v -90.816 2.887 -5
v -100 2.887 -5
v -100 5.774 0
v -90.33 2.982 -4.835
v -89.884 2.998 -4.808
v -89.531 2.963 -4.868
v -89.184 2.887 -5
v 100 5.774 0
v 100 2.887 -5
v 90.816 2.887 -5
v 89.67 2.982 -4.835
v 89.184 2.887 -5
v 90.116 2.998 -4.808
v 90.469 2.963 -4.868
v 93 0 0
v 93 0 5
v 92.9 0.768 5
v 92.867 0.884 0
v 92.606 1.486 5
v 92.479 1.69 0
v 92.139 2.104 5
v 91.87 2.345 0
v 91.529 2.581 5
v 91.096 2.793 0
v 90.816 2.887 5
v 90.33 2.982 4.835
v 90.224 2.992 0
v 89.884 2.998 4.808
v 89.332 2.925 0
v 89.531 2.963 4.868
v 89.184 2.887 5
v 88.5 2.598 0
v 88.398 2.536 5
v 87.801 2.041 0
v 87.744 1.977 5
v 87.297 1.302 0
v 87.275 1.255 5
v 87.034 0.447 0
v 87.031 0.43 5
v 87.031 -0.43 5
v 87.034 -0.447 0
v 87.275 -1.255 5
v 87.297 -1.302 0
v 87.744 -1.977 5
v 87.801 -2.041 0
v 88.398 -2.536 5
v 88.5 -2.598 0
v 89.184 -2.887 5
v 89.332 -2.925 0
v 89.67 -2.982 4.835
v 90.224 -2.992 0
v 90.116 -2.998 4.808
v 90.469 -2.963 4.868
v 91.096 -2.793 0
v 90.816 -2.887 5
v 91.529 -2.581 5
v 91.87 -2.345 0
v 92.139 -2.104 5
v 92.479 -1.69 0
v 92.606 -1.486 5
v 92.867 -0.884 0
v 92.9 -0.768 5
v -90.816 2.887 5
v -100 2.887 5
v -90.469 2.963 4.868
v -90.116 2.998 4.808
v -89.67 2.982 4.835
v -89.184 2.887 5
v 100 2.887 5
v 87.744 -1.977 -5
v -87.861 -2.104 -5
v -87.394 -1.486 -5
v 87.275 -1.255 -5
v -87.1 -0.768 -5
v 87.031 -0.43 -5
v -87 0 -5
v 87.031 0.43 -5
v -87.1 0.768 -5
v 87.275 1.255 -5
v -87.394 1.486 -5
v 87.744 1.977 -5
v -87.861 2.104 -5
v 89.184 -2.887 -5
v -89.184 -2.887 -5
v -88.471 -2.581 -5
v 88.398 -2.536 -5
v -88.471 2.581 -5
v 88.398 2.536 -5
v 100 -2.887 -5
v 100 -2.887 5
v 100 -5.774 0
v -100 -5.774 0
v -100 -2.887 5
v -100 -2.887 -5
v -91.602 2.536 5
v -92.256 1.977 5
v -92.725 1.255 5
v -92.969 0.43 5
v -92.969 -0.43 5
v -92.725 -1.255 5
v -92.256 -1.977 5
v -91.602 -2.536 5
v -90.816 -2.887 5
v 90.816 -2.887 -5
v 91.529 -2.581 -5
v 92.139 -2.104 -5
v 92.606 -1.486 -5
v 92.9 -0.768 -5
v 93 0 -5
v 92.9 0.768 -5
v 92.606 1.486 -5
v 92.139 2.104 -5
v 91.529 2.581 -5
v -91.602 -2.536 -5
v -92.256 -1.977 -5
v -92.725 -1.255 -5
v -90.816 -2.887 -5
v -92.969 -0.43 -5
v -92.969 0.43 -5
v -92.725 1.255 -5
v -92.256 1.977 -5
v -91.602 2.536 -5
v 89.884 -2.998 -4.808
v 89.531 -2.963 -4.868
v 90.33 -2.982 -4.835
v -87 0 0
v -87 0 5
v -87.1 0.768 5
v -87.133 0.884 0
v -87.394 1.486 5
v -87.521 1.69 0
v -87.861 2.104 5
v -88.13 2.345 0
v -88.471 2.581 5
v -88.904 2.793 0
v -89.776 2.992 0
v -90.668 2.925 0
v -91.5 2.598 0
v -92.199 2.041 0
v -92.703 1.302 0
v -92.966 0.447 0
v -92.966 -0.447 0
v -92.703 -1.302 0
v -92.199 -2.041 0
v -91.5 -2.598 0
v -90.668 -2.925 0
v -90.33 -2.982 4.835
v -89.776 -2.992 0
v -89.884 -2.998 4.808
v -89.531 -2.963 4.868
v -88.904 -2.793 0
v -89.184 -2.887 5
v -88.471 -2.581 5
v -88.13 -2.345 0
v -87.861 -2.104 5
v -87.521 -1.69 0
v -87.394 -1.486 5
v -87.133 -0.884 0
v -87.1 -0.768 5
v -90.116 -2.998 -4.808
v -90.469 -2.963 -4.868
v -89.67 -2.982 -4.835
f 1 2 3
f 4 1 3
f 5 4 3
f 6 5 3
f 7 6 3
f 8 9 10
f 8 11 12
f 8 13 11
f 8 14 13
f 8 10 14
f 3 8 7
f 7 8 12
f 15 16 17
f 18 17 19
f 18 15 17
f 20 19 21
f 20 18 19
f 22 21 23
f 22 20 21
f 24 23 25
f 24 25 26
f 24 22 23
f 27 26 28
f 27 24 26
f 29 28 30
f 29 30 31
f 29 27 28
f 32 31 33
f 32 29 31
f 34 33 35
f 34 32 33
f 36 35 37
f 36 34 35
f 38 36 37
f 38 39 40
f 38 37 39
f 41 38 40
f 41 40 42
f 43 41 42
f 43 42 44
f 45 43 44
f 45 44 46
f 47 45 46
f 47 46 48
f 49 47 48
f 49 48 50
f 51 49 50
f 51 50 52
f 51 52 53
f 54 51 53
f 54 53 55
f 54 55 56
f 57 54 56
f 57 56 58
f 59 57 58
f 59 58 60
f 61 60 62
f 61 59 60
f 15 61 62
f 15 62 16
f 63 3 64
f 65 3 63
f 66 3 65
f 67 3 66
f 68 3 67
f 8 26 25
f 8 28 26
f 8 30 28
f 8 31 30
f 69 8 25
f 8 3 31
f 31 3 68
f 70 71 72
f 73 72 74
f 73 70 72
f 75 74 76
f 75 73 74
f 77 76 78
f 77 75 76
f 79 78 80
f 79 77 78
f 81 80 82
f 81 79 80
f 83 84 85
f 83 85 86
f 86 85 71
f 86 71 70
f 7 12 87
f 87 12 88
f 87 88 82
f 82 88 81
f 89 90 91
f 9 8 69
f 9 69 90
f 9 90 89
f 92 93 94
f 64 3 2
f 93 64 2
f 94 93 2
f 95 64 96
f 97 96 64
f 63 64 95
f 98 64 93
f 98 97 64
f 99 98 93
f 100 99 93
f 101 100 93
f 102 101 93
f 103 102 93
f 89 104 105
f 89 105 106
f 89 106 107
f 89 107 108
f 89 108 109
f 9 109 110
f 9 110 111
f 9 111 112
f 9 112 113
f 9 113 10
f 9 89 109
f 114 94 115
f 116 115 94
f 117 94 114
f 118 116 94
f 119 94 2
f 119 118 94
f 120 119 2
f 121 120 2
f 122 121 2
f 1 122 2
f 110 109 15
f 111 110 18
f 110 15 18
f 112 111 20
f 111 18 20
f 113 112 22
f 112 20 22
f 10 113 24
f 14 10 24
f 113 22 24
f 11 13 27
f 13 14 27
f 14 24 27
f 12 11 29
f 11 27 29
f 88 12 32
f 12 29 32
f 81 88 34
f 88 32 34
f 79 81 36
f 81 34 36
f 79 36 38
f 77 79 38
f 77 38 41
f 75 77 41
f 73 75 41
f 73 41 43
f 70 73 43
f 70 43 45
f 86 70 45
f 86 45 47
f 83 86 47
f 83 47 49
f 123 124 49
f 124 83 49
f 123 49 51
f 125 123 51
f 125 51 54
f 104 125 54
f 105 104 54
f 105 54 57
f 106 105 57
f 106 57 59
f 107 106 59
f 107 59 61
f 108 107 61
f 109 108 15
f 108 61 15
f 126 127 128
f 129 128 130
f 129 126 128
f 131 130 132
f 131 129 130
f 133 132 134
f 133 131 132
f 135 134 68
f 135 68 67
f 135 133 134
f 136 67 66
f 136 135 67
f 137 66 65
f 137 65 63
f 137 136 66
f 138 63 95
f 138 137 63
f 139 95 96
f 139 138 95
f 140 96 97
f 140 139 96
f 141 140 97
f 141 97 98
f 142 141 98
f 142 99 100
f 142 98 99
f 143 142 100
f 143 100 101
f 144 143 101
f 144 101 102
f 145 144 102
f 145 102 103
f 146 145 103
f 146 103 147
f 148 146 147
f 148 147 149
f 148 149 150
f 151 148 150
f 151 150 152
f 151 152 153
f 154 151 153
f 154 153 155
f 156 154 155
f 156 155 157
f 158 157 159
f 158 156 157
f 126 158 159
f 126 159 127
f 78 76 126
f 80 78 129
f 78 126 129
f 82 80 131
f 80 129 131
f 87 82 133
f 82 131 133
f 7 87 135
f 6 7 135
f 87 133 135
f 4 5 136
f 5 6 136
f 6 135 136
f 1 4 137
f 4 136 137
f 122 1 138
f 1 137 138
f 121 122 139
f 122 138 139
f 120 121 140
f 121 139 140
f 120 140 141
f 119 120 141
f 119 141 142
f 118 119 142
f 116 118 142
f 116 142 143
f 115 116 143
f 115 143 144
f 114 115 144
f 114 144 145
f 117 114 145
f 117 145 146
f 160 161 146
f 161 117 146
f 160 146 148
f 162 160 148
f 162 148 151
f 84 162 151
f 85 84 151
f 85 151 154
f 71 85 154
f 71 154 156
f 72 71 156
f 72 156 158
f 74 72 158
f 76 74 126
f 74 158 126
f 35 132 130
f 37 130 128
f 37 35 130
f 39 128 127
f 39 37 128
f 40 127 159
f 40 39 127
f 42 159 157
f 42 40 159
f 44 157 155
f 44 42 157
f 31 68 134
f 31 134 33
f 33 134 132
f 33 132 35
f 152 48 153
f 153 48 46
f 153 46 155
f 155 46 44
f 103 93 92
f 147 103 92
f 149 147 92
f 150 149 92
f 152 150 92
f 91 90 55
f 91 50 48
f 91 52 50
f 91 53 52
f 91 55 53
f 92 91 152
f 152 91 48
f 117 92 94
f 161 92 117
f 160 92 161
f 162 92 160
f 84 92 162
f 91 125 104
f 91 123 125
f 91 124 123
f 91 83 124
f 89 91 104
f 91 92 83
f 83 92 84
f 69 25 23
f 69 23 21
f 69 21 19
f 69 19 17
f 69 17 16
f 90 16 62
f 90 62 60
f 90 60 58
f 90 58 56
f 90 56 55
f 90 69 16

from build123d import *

# Parameters (mm, degrees)
BOSS_EXTRUDE1_DEPTH     = 100
SKETCH2_R               = 3
CUT_EXTRUDE1_DEPTH      = 6
CUT_EXTRUDE1_DEPTH_BACK = 6


with BuildPart() as part:
    # Sketch1 → Boss-Extrude1 (new body, symmetric)
    with BuildSketch(Plane(origin=(0, 0, 0), x_dir=(0, 0, -1), z_dir=(1, 0, 0))):
        Polygon((0, 5.773502692), (-5, 2.886751346), (-5, -2.886751346), (0, -5.773502692), (5, -2.886751346), (5, 2.886751346), align=None)
    extrude(amount=BOSS_EXTRUDE1_DEPTH, both=True)

    # Sketch2 → Cut-Extrude1 (cut, two sides)
    with BuildSketch(Plane.XY) as cut_extrude1_sk:
        with Locations((90, 0)):
            Circle(SKETCH2_R)
        with Locations((-90, 0)):
            Circle(SKETCH2_R)
    extrude(amount=CUT_EXTRUDE1_DEPTH, mode=Mode.SUBTRACT)
    extrude(cut_extrude1_sk.sketch, amount=-CUT_EXTRUDE1_DEPTH_BACK, mode=Mode.SUBTRACT)


solid = part.part
